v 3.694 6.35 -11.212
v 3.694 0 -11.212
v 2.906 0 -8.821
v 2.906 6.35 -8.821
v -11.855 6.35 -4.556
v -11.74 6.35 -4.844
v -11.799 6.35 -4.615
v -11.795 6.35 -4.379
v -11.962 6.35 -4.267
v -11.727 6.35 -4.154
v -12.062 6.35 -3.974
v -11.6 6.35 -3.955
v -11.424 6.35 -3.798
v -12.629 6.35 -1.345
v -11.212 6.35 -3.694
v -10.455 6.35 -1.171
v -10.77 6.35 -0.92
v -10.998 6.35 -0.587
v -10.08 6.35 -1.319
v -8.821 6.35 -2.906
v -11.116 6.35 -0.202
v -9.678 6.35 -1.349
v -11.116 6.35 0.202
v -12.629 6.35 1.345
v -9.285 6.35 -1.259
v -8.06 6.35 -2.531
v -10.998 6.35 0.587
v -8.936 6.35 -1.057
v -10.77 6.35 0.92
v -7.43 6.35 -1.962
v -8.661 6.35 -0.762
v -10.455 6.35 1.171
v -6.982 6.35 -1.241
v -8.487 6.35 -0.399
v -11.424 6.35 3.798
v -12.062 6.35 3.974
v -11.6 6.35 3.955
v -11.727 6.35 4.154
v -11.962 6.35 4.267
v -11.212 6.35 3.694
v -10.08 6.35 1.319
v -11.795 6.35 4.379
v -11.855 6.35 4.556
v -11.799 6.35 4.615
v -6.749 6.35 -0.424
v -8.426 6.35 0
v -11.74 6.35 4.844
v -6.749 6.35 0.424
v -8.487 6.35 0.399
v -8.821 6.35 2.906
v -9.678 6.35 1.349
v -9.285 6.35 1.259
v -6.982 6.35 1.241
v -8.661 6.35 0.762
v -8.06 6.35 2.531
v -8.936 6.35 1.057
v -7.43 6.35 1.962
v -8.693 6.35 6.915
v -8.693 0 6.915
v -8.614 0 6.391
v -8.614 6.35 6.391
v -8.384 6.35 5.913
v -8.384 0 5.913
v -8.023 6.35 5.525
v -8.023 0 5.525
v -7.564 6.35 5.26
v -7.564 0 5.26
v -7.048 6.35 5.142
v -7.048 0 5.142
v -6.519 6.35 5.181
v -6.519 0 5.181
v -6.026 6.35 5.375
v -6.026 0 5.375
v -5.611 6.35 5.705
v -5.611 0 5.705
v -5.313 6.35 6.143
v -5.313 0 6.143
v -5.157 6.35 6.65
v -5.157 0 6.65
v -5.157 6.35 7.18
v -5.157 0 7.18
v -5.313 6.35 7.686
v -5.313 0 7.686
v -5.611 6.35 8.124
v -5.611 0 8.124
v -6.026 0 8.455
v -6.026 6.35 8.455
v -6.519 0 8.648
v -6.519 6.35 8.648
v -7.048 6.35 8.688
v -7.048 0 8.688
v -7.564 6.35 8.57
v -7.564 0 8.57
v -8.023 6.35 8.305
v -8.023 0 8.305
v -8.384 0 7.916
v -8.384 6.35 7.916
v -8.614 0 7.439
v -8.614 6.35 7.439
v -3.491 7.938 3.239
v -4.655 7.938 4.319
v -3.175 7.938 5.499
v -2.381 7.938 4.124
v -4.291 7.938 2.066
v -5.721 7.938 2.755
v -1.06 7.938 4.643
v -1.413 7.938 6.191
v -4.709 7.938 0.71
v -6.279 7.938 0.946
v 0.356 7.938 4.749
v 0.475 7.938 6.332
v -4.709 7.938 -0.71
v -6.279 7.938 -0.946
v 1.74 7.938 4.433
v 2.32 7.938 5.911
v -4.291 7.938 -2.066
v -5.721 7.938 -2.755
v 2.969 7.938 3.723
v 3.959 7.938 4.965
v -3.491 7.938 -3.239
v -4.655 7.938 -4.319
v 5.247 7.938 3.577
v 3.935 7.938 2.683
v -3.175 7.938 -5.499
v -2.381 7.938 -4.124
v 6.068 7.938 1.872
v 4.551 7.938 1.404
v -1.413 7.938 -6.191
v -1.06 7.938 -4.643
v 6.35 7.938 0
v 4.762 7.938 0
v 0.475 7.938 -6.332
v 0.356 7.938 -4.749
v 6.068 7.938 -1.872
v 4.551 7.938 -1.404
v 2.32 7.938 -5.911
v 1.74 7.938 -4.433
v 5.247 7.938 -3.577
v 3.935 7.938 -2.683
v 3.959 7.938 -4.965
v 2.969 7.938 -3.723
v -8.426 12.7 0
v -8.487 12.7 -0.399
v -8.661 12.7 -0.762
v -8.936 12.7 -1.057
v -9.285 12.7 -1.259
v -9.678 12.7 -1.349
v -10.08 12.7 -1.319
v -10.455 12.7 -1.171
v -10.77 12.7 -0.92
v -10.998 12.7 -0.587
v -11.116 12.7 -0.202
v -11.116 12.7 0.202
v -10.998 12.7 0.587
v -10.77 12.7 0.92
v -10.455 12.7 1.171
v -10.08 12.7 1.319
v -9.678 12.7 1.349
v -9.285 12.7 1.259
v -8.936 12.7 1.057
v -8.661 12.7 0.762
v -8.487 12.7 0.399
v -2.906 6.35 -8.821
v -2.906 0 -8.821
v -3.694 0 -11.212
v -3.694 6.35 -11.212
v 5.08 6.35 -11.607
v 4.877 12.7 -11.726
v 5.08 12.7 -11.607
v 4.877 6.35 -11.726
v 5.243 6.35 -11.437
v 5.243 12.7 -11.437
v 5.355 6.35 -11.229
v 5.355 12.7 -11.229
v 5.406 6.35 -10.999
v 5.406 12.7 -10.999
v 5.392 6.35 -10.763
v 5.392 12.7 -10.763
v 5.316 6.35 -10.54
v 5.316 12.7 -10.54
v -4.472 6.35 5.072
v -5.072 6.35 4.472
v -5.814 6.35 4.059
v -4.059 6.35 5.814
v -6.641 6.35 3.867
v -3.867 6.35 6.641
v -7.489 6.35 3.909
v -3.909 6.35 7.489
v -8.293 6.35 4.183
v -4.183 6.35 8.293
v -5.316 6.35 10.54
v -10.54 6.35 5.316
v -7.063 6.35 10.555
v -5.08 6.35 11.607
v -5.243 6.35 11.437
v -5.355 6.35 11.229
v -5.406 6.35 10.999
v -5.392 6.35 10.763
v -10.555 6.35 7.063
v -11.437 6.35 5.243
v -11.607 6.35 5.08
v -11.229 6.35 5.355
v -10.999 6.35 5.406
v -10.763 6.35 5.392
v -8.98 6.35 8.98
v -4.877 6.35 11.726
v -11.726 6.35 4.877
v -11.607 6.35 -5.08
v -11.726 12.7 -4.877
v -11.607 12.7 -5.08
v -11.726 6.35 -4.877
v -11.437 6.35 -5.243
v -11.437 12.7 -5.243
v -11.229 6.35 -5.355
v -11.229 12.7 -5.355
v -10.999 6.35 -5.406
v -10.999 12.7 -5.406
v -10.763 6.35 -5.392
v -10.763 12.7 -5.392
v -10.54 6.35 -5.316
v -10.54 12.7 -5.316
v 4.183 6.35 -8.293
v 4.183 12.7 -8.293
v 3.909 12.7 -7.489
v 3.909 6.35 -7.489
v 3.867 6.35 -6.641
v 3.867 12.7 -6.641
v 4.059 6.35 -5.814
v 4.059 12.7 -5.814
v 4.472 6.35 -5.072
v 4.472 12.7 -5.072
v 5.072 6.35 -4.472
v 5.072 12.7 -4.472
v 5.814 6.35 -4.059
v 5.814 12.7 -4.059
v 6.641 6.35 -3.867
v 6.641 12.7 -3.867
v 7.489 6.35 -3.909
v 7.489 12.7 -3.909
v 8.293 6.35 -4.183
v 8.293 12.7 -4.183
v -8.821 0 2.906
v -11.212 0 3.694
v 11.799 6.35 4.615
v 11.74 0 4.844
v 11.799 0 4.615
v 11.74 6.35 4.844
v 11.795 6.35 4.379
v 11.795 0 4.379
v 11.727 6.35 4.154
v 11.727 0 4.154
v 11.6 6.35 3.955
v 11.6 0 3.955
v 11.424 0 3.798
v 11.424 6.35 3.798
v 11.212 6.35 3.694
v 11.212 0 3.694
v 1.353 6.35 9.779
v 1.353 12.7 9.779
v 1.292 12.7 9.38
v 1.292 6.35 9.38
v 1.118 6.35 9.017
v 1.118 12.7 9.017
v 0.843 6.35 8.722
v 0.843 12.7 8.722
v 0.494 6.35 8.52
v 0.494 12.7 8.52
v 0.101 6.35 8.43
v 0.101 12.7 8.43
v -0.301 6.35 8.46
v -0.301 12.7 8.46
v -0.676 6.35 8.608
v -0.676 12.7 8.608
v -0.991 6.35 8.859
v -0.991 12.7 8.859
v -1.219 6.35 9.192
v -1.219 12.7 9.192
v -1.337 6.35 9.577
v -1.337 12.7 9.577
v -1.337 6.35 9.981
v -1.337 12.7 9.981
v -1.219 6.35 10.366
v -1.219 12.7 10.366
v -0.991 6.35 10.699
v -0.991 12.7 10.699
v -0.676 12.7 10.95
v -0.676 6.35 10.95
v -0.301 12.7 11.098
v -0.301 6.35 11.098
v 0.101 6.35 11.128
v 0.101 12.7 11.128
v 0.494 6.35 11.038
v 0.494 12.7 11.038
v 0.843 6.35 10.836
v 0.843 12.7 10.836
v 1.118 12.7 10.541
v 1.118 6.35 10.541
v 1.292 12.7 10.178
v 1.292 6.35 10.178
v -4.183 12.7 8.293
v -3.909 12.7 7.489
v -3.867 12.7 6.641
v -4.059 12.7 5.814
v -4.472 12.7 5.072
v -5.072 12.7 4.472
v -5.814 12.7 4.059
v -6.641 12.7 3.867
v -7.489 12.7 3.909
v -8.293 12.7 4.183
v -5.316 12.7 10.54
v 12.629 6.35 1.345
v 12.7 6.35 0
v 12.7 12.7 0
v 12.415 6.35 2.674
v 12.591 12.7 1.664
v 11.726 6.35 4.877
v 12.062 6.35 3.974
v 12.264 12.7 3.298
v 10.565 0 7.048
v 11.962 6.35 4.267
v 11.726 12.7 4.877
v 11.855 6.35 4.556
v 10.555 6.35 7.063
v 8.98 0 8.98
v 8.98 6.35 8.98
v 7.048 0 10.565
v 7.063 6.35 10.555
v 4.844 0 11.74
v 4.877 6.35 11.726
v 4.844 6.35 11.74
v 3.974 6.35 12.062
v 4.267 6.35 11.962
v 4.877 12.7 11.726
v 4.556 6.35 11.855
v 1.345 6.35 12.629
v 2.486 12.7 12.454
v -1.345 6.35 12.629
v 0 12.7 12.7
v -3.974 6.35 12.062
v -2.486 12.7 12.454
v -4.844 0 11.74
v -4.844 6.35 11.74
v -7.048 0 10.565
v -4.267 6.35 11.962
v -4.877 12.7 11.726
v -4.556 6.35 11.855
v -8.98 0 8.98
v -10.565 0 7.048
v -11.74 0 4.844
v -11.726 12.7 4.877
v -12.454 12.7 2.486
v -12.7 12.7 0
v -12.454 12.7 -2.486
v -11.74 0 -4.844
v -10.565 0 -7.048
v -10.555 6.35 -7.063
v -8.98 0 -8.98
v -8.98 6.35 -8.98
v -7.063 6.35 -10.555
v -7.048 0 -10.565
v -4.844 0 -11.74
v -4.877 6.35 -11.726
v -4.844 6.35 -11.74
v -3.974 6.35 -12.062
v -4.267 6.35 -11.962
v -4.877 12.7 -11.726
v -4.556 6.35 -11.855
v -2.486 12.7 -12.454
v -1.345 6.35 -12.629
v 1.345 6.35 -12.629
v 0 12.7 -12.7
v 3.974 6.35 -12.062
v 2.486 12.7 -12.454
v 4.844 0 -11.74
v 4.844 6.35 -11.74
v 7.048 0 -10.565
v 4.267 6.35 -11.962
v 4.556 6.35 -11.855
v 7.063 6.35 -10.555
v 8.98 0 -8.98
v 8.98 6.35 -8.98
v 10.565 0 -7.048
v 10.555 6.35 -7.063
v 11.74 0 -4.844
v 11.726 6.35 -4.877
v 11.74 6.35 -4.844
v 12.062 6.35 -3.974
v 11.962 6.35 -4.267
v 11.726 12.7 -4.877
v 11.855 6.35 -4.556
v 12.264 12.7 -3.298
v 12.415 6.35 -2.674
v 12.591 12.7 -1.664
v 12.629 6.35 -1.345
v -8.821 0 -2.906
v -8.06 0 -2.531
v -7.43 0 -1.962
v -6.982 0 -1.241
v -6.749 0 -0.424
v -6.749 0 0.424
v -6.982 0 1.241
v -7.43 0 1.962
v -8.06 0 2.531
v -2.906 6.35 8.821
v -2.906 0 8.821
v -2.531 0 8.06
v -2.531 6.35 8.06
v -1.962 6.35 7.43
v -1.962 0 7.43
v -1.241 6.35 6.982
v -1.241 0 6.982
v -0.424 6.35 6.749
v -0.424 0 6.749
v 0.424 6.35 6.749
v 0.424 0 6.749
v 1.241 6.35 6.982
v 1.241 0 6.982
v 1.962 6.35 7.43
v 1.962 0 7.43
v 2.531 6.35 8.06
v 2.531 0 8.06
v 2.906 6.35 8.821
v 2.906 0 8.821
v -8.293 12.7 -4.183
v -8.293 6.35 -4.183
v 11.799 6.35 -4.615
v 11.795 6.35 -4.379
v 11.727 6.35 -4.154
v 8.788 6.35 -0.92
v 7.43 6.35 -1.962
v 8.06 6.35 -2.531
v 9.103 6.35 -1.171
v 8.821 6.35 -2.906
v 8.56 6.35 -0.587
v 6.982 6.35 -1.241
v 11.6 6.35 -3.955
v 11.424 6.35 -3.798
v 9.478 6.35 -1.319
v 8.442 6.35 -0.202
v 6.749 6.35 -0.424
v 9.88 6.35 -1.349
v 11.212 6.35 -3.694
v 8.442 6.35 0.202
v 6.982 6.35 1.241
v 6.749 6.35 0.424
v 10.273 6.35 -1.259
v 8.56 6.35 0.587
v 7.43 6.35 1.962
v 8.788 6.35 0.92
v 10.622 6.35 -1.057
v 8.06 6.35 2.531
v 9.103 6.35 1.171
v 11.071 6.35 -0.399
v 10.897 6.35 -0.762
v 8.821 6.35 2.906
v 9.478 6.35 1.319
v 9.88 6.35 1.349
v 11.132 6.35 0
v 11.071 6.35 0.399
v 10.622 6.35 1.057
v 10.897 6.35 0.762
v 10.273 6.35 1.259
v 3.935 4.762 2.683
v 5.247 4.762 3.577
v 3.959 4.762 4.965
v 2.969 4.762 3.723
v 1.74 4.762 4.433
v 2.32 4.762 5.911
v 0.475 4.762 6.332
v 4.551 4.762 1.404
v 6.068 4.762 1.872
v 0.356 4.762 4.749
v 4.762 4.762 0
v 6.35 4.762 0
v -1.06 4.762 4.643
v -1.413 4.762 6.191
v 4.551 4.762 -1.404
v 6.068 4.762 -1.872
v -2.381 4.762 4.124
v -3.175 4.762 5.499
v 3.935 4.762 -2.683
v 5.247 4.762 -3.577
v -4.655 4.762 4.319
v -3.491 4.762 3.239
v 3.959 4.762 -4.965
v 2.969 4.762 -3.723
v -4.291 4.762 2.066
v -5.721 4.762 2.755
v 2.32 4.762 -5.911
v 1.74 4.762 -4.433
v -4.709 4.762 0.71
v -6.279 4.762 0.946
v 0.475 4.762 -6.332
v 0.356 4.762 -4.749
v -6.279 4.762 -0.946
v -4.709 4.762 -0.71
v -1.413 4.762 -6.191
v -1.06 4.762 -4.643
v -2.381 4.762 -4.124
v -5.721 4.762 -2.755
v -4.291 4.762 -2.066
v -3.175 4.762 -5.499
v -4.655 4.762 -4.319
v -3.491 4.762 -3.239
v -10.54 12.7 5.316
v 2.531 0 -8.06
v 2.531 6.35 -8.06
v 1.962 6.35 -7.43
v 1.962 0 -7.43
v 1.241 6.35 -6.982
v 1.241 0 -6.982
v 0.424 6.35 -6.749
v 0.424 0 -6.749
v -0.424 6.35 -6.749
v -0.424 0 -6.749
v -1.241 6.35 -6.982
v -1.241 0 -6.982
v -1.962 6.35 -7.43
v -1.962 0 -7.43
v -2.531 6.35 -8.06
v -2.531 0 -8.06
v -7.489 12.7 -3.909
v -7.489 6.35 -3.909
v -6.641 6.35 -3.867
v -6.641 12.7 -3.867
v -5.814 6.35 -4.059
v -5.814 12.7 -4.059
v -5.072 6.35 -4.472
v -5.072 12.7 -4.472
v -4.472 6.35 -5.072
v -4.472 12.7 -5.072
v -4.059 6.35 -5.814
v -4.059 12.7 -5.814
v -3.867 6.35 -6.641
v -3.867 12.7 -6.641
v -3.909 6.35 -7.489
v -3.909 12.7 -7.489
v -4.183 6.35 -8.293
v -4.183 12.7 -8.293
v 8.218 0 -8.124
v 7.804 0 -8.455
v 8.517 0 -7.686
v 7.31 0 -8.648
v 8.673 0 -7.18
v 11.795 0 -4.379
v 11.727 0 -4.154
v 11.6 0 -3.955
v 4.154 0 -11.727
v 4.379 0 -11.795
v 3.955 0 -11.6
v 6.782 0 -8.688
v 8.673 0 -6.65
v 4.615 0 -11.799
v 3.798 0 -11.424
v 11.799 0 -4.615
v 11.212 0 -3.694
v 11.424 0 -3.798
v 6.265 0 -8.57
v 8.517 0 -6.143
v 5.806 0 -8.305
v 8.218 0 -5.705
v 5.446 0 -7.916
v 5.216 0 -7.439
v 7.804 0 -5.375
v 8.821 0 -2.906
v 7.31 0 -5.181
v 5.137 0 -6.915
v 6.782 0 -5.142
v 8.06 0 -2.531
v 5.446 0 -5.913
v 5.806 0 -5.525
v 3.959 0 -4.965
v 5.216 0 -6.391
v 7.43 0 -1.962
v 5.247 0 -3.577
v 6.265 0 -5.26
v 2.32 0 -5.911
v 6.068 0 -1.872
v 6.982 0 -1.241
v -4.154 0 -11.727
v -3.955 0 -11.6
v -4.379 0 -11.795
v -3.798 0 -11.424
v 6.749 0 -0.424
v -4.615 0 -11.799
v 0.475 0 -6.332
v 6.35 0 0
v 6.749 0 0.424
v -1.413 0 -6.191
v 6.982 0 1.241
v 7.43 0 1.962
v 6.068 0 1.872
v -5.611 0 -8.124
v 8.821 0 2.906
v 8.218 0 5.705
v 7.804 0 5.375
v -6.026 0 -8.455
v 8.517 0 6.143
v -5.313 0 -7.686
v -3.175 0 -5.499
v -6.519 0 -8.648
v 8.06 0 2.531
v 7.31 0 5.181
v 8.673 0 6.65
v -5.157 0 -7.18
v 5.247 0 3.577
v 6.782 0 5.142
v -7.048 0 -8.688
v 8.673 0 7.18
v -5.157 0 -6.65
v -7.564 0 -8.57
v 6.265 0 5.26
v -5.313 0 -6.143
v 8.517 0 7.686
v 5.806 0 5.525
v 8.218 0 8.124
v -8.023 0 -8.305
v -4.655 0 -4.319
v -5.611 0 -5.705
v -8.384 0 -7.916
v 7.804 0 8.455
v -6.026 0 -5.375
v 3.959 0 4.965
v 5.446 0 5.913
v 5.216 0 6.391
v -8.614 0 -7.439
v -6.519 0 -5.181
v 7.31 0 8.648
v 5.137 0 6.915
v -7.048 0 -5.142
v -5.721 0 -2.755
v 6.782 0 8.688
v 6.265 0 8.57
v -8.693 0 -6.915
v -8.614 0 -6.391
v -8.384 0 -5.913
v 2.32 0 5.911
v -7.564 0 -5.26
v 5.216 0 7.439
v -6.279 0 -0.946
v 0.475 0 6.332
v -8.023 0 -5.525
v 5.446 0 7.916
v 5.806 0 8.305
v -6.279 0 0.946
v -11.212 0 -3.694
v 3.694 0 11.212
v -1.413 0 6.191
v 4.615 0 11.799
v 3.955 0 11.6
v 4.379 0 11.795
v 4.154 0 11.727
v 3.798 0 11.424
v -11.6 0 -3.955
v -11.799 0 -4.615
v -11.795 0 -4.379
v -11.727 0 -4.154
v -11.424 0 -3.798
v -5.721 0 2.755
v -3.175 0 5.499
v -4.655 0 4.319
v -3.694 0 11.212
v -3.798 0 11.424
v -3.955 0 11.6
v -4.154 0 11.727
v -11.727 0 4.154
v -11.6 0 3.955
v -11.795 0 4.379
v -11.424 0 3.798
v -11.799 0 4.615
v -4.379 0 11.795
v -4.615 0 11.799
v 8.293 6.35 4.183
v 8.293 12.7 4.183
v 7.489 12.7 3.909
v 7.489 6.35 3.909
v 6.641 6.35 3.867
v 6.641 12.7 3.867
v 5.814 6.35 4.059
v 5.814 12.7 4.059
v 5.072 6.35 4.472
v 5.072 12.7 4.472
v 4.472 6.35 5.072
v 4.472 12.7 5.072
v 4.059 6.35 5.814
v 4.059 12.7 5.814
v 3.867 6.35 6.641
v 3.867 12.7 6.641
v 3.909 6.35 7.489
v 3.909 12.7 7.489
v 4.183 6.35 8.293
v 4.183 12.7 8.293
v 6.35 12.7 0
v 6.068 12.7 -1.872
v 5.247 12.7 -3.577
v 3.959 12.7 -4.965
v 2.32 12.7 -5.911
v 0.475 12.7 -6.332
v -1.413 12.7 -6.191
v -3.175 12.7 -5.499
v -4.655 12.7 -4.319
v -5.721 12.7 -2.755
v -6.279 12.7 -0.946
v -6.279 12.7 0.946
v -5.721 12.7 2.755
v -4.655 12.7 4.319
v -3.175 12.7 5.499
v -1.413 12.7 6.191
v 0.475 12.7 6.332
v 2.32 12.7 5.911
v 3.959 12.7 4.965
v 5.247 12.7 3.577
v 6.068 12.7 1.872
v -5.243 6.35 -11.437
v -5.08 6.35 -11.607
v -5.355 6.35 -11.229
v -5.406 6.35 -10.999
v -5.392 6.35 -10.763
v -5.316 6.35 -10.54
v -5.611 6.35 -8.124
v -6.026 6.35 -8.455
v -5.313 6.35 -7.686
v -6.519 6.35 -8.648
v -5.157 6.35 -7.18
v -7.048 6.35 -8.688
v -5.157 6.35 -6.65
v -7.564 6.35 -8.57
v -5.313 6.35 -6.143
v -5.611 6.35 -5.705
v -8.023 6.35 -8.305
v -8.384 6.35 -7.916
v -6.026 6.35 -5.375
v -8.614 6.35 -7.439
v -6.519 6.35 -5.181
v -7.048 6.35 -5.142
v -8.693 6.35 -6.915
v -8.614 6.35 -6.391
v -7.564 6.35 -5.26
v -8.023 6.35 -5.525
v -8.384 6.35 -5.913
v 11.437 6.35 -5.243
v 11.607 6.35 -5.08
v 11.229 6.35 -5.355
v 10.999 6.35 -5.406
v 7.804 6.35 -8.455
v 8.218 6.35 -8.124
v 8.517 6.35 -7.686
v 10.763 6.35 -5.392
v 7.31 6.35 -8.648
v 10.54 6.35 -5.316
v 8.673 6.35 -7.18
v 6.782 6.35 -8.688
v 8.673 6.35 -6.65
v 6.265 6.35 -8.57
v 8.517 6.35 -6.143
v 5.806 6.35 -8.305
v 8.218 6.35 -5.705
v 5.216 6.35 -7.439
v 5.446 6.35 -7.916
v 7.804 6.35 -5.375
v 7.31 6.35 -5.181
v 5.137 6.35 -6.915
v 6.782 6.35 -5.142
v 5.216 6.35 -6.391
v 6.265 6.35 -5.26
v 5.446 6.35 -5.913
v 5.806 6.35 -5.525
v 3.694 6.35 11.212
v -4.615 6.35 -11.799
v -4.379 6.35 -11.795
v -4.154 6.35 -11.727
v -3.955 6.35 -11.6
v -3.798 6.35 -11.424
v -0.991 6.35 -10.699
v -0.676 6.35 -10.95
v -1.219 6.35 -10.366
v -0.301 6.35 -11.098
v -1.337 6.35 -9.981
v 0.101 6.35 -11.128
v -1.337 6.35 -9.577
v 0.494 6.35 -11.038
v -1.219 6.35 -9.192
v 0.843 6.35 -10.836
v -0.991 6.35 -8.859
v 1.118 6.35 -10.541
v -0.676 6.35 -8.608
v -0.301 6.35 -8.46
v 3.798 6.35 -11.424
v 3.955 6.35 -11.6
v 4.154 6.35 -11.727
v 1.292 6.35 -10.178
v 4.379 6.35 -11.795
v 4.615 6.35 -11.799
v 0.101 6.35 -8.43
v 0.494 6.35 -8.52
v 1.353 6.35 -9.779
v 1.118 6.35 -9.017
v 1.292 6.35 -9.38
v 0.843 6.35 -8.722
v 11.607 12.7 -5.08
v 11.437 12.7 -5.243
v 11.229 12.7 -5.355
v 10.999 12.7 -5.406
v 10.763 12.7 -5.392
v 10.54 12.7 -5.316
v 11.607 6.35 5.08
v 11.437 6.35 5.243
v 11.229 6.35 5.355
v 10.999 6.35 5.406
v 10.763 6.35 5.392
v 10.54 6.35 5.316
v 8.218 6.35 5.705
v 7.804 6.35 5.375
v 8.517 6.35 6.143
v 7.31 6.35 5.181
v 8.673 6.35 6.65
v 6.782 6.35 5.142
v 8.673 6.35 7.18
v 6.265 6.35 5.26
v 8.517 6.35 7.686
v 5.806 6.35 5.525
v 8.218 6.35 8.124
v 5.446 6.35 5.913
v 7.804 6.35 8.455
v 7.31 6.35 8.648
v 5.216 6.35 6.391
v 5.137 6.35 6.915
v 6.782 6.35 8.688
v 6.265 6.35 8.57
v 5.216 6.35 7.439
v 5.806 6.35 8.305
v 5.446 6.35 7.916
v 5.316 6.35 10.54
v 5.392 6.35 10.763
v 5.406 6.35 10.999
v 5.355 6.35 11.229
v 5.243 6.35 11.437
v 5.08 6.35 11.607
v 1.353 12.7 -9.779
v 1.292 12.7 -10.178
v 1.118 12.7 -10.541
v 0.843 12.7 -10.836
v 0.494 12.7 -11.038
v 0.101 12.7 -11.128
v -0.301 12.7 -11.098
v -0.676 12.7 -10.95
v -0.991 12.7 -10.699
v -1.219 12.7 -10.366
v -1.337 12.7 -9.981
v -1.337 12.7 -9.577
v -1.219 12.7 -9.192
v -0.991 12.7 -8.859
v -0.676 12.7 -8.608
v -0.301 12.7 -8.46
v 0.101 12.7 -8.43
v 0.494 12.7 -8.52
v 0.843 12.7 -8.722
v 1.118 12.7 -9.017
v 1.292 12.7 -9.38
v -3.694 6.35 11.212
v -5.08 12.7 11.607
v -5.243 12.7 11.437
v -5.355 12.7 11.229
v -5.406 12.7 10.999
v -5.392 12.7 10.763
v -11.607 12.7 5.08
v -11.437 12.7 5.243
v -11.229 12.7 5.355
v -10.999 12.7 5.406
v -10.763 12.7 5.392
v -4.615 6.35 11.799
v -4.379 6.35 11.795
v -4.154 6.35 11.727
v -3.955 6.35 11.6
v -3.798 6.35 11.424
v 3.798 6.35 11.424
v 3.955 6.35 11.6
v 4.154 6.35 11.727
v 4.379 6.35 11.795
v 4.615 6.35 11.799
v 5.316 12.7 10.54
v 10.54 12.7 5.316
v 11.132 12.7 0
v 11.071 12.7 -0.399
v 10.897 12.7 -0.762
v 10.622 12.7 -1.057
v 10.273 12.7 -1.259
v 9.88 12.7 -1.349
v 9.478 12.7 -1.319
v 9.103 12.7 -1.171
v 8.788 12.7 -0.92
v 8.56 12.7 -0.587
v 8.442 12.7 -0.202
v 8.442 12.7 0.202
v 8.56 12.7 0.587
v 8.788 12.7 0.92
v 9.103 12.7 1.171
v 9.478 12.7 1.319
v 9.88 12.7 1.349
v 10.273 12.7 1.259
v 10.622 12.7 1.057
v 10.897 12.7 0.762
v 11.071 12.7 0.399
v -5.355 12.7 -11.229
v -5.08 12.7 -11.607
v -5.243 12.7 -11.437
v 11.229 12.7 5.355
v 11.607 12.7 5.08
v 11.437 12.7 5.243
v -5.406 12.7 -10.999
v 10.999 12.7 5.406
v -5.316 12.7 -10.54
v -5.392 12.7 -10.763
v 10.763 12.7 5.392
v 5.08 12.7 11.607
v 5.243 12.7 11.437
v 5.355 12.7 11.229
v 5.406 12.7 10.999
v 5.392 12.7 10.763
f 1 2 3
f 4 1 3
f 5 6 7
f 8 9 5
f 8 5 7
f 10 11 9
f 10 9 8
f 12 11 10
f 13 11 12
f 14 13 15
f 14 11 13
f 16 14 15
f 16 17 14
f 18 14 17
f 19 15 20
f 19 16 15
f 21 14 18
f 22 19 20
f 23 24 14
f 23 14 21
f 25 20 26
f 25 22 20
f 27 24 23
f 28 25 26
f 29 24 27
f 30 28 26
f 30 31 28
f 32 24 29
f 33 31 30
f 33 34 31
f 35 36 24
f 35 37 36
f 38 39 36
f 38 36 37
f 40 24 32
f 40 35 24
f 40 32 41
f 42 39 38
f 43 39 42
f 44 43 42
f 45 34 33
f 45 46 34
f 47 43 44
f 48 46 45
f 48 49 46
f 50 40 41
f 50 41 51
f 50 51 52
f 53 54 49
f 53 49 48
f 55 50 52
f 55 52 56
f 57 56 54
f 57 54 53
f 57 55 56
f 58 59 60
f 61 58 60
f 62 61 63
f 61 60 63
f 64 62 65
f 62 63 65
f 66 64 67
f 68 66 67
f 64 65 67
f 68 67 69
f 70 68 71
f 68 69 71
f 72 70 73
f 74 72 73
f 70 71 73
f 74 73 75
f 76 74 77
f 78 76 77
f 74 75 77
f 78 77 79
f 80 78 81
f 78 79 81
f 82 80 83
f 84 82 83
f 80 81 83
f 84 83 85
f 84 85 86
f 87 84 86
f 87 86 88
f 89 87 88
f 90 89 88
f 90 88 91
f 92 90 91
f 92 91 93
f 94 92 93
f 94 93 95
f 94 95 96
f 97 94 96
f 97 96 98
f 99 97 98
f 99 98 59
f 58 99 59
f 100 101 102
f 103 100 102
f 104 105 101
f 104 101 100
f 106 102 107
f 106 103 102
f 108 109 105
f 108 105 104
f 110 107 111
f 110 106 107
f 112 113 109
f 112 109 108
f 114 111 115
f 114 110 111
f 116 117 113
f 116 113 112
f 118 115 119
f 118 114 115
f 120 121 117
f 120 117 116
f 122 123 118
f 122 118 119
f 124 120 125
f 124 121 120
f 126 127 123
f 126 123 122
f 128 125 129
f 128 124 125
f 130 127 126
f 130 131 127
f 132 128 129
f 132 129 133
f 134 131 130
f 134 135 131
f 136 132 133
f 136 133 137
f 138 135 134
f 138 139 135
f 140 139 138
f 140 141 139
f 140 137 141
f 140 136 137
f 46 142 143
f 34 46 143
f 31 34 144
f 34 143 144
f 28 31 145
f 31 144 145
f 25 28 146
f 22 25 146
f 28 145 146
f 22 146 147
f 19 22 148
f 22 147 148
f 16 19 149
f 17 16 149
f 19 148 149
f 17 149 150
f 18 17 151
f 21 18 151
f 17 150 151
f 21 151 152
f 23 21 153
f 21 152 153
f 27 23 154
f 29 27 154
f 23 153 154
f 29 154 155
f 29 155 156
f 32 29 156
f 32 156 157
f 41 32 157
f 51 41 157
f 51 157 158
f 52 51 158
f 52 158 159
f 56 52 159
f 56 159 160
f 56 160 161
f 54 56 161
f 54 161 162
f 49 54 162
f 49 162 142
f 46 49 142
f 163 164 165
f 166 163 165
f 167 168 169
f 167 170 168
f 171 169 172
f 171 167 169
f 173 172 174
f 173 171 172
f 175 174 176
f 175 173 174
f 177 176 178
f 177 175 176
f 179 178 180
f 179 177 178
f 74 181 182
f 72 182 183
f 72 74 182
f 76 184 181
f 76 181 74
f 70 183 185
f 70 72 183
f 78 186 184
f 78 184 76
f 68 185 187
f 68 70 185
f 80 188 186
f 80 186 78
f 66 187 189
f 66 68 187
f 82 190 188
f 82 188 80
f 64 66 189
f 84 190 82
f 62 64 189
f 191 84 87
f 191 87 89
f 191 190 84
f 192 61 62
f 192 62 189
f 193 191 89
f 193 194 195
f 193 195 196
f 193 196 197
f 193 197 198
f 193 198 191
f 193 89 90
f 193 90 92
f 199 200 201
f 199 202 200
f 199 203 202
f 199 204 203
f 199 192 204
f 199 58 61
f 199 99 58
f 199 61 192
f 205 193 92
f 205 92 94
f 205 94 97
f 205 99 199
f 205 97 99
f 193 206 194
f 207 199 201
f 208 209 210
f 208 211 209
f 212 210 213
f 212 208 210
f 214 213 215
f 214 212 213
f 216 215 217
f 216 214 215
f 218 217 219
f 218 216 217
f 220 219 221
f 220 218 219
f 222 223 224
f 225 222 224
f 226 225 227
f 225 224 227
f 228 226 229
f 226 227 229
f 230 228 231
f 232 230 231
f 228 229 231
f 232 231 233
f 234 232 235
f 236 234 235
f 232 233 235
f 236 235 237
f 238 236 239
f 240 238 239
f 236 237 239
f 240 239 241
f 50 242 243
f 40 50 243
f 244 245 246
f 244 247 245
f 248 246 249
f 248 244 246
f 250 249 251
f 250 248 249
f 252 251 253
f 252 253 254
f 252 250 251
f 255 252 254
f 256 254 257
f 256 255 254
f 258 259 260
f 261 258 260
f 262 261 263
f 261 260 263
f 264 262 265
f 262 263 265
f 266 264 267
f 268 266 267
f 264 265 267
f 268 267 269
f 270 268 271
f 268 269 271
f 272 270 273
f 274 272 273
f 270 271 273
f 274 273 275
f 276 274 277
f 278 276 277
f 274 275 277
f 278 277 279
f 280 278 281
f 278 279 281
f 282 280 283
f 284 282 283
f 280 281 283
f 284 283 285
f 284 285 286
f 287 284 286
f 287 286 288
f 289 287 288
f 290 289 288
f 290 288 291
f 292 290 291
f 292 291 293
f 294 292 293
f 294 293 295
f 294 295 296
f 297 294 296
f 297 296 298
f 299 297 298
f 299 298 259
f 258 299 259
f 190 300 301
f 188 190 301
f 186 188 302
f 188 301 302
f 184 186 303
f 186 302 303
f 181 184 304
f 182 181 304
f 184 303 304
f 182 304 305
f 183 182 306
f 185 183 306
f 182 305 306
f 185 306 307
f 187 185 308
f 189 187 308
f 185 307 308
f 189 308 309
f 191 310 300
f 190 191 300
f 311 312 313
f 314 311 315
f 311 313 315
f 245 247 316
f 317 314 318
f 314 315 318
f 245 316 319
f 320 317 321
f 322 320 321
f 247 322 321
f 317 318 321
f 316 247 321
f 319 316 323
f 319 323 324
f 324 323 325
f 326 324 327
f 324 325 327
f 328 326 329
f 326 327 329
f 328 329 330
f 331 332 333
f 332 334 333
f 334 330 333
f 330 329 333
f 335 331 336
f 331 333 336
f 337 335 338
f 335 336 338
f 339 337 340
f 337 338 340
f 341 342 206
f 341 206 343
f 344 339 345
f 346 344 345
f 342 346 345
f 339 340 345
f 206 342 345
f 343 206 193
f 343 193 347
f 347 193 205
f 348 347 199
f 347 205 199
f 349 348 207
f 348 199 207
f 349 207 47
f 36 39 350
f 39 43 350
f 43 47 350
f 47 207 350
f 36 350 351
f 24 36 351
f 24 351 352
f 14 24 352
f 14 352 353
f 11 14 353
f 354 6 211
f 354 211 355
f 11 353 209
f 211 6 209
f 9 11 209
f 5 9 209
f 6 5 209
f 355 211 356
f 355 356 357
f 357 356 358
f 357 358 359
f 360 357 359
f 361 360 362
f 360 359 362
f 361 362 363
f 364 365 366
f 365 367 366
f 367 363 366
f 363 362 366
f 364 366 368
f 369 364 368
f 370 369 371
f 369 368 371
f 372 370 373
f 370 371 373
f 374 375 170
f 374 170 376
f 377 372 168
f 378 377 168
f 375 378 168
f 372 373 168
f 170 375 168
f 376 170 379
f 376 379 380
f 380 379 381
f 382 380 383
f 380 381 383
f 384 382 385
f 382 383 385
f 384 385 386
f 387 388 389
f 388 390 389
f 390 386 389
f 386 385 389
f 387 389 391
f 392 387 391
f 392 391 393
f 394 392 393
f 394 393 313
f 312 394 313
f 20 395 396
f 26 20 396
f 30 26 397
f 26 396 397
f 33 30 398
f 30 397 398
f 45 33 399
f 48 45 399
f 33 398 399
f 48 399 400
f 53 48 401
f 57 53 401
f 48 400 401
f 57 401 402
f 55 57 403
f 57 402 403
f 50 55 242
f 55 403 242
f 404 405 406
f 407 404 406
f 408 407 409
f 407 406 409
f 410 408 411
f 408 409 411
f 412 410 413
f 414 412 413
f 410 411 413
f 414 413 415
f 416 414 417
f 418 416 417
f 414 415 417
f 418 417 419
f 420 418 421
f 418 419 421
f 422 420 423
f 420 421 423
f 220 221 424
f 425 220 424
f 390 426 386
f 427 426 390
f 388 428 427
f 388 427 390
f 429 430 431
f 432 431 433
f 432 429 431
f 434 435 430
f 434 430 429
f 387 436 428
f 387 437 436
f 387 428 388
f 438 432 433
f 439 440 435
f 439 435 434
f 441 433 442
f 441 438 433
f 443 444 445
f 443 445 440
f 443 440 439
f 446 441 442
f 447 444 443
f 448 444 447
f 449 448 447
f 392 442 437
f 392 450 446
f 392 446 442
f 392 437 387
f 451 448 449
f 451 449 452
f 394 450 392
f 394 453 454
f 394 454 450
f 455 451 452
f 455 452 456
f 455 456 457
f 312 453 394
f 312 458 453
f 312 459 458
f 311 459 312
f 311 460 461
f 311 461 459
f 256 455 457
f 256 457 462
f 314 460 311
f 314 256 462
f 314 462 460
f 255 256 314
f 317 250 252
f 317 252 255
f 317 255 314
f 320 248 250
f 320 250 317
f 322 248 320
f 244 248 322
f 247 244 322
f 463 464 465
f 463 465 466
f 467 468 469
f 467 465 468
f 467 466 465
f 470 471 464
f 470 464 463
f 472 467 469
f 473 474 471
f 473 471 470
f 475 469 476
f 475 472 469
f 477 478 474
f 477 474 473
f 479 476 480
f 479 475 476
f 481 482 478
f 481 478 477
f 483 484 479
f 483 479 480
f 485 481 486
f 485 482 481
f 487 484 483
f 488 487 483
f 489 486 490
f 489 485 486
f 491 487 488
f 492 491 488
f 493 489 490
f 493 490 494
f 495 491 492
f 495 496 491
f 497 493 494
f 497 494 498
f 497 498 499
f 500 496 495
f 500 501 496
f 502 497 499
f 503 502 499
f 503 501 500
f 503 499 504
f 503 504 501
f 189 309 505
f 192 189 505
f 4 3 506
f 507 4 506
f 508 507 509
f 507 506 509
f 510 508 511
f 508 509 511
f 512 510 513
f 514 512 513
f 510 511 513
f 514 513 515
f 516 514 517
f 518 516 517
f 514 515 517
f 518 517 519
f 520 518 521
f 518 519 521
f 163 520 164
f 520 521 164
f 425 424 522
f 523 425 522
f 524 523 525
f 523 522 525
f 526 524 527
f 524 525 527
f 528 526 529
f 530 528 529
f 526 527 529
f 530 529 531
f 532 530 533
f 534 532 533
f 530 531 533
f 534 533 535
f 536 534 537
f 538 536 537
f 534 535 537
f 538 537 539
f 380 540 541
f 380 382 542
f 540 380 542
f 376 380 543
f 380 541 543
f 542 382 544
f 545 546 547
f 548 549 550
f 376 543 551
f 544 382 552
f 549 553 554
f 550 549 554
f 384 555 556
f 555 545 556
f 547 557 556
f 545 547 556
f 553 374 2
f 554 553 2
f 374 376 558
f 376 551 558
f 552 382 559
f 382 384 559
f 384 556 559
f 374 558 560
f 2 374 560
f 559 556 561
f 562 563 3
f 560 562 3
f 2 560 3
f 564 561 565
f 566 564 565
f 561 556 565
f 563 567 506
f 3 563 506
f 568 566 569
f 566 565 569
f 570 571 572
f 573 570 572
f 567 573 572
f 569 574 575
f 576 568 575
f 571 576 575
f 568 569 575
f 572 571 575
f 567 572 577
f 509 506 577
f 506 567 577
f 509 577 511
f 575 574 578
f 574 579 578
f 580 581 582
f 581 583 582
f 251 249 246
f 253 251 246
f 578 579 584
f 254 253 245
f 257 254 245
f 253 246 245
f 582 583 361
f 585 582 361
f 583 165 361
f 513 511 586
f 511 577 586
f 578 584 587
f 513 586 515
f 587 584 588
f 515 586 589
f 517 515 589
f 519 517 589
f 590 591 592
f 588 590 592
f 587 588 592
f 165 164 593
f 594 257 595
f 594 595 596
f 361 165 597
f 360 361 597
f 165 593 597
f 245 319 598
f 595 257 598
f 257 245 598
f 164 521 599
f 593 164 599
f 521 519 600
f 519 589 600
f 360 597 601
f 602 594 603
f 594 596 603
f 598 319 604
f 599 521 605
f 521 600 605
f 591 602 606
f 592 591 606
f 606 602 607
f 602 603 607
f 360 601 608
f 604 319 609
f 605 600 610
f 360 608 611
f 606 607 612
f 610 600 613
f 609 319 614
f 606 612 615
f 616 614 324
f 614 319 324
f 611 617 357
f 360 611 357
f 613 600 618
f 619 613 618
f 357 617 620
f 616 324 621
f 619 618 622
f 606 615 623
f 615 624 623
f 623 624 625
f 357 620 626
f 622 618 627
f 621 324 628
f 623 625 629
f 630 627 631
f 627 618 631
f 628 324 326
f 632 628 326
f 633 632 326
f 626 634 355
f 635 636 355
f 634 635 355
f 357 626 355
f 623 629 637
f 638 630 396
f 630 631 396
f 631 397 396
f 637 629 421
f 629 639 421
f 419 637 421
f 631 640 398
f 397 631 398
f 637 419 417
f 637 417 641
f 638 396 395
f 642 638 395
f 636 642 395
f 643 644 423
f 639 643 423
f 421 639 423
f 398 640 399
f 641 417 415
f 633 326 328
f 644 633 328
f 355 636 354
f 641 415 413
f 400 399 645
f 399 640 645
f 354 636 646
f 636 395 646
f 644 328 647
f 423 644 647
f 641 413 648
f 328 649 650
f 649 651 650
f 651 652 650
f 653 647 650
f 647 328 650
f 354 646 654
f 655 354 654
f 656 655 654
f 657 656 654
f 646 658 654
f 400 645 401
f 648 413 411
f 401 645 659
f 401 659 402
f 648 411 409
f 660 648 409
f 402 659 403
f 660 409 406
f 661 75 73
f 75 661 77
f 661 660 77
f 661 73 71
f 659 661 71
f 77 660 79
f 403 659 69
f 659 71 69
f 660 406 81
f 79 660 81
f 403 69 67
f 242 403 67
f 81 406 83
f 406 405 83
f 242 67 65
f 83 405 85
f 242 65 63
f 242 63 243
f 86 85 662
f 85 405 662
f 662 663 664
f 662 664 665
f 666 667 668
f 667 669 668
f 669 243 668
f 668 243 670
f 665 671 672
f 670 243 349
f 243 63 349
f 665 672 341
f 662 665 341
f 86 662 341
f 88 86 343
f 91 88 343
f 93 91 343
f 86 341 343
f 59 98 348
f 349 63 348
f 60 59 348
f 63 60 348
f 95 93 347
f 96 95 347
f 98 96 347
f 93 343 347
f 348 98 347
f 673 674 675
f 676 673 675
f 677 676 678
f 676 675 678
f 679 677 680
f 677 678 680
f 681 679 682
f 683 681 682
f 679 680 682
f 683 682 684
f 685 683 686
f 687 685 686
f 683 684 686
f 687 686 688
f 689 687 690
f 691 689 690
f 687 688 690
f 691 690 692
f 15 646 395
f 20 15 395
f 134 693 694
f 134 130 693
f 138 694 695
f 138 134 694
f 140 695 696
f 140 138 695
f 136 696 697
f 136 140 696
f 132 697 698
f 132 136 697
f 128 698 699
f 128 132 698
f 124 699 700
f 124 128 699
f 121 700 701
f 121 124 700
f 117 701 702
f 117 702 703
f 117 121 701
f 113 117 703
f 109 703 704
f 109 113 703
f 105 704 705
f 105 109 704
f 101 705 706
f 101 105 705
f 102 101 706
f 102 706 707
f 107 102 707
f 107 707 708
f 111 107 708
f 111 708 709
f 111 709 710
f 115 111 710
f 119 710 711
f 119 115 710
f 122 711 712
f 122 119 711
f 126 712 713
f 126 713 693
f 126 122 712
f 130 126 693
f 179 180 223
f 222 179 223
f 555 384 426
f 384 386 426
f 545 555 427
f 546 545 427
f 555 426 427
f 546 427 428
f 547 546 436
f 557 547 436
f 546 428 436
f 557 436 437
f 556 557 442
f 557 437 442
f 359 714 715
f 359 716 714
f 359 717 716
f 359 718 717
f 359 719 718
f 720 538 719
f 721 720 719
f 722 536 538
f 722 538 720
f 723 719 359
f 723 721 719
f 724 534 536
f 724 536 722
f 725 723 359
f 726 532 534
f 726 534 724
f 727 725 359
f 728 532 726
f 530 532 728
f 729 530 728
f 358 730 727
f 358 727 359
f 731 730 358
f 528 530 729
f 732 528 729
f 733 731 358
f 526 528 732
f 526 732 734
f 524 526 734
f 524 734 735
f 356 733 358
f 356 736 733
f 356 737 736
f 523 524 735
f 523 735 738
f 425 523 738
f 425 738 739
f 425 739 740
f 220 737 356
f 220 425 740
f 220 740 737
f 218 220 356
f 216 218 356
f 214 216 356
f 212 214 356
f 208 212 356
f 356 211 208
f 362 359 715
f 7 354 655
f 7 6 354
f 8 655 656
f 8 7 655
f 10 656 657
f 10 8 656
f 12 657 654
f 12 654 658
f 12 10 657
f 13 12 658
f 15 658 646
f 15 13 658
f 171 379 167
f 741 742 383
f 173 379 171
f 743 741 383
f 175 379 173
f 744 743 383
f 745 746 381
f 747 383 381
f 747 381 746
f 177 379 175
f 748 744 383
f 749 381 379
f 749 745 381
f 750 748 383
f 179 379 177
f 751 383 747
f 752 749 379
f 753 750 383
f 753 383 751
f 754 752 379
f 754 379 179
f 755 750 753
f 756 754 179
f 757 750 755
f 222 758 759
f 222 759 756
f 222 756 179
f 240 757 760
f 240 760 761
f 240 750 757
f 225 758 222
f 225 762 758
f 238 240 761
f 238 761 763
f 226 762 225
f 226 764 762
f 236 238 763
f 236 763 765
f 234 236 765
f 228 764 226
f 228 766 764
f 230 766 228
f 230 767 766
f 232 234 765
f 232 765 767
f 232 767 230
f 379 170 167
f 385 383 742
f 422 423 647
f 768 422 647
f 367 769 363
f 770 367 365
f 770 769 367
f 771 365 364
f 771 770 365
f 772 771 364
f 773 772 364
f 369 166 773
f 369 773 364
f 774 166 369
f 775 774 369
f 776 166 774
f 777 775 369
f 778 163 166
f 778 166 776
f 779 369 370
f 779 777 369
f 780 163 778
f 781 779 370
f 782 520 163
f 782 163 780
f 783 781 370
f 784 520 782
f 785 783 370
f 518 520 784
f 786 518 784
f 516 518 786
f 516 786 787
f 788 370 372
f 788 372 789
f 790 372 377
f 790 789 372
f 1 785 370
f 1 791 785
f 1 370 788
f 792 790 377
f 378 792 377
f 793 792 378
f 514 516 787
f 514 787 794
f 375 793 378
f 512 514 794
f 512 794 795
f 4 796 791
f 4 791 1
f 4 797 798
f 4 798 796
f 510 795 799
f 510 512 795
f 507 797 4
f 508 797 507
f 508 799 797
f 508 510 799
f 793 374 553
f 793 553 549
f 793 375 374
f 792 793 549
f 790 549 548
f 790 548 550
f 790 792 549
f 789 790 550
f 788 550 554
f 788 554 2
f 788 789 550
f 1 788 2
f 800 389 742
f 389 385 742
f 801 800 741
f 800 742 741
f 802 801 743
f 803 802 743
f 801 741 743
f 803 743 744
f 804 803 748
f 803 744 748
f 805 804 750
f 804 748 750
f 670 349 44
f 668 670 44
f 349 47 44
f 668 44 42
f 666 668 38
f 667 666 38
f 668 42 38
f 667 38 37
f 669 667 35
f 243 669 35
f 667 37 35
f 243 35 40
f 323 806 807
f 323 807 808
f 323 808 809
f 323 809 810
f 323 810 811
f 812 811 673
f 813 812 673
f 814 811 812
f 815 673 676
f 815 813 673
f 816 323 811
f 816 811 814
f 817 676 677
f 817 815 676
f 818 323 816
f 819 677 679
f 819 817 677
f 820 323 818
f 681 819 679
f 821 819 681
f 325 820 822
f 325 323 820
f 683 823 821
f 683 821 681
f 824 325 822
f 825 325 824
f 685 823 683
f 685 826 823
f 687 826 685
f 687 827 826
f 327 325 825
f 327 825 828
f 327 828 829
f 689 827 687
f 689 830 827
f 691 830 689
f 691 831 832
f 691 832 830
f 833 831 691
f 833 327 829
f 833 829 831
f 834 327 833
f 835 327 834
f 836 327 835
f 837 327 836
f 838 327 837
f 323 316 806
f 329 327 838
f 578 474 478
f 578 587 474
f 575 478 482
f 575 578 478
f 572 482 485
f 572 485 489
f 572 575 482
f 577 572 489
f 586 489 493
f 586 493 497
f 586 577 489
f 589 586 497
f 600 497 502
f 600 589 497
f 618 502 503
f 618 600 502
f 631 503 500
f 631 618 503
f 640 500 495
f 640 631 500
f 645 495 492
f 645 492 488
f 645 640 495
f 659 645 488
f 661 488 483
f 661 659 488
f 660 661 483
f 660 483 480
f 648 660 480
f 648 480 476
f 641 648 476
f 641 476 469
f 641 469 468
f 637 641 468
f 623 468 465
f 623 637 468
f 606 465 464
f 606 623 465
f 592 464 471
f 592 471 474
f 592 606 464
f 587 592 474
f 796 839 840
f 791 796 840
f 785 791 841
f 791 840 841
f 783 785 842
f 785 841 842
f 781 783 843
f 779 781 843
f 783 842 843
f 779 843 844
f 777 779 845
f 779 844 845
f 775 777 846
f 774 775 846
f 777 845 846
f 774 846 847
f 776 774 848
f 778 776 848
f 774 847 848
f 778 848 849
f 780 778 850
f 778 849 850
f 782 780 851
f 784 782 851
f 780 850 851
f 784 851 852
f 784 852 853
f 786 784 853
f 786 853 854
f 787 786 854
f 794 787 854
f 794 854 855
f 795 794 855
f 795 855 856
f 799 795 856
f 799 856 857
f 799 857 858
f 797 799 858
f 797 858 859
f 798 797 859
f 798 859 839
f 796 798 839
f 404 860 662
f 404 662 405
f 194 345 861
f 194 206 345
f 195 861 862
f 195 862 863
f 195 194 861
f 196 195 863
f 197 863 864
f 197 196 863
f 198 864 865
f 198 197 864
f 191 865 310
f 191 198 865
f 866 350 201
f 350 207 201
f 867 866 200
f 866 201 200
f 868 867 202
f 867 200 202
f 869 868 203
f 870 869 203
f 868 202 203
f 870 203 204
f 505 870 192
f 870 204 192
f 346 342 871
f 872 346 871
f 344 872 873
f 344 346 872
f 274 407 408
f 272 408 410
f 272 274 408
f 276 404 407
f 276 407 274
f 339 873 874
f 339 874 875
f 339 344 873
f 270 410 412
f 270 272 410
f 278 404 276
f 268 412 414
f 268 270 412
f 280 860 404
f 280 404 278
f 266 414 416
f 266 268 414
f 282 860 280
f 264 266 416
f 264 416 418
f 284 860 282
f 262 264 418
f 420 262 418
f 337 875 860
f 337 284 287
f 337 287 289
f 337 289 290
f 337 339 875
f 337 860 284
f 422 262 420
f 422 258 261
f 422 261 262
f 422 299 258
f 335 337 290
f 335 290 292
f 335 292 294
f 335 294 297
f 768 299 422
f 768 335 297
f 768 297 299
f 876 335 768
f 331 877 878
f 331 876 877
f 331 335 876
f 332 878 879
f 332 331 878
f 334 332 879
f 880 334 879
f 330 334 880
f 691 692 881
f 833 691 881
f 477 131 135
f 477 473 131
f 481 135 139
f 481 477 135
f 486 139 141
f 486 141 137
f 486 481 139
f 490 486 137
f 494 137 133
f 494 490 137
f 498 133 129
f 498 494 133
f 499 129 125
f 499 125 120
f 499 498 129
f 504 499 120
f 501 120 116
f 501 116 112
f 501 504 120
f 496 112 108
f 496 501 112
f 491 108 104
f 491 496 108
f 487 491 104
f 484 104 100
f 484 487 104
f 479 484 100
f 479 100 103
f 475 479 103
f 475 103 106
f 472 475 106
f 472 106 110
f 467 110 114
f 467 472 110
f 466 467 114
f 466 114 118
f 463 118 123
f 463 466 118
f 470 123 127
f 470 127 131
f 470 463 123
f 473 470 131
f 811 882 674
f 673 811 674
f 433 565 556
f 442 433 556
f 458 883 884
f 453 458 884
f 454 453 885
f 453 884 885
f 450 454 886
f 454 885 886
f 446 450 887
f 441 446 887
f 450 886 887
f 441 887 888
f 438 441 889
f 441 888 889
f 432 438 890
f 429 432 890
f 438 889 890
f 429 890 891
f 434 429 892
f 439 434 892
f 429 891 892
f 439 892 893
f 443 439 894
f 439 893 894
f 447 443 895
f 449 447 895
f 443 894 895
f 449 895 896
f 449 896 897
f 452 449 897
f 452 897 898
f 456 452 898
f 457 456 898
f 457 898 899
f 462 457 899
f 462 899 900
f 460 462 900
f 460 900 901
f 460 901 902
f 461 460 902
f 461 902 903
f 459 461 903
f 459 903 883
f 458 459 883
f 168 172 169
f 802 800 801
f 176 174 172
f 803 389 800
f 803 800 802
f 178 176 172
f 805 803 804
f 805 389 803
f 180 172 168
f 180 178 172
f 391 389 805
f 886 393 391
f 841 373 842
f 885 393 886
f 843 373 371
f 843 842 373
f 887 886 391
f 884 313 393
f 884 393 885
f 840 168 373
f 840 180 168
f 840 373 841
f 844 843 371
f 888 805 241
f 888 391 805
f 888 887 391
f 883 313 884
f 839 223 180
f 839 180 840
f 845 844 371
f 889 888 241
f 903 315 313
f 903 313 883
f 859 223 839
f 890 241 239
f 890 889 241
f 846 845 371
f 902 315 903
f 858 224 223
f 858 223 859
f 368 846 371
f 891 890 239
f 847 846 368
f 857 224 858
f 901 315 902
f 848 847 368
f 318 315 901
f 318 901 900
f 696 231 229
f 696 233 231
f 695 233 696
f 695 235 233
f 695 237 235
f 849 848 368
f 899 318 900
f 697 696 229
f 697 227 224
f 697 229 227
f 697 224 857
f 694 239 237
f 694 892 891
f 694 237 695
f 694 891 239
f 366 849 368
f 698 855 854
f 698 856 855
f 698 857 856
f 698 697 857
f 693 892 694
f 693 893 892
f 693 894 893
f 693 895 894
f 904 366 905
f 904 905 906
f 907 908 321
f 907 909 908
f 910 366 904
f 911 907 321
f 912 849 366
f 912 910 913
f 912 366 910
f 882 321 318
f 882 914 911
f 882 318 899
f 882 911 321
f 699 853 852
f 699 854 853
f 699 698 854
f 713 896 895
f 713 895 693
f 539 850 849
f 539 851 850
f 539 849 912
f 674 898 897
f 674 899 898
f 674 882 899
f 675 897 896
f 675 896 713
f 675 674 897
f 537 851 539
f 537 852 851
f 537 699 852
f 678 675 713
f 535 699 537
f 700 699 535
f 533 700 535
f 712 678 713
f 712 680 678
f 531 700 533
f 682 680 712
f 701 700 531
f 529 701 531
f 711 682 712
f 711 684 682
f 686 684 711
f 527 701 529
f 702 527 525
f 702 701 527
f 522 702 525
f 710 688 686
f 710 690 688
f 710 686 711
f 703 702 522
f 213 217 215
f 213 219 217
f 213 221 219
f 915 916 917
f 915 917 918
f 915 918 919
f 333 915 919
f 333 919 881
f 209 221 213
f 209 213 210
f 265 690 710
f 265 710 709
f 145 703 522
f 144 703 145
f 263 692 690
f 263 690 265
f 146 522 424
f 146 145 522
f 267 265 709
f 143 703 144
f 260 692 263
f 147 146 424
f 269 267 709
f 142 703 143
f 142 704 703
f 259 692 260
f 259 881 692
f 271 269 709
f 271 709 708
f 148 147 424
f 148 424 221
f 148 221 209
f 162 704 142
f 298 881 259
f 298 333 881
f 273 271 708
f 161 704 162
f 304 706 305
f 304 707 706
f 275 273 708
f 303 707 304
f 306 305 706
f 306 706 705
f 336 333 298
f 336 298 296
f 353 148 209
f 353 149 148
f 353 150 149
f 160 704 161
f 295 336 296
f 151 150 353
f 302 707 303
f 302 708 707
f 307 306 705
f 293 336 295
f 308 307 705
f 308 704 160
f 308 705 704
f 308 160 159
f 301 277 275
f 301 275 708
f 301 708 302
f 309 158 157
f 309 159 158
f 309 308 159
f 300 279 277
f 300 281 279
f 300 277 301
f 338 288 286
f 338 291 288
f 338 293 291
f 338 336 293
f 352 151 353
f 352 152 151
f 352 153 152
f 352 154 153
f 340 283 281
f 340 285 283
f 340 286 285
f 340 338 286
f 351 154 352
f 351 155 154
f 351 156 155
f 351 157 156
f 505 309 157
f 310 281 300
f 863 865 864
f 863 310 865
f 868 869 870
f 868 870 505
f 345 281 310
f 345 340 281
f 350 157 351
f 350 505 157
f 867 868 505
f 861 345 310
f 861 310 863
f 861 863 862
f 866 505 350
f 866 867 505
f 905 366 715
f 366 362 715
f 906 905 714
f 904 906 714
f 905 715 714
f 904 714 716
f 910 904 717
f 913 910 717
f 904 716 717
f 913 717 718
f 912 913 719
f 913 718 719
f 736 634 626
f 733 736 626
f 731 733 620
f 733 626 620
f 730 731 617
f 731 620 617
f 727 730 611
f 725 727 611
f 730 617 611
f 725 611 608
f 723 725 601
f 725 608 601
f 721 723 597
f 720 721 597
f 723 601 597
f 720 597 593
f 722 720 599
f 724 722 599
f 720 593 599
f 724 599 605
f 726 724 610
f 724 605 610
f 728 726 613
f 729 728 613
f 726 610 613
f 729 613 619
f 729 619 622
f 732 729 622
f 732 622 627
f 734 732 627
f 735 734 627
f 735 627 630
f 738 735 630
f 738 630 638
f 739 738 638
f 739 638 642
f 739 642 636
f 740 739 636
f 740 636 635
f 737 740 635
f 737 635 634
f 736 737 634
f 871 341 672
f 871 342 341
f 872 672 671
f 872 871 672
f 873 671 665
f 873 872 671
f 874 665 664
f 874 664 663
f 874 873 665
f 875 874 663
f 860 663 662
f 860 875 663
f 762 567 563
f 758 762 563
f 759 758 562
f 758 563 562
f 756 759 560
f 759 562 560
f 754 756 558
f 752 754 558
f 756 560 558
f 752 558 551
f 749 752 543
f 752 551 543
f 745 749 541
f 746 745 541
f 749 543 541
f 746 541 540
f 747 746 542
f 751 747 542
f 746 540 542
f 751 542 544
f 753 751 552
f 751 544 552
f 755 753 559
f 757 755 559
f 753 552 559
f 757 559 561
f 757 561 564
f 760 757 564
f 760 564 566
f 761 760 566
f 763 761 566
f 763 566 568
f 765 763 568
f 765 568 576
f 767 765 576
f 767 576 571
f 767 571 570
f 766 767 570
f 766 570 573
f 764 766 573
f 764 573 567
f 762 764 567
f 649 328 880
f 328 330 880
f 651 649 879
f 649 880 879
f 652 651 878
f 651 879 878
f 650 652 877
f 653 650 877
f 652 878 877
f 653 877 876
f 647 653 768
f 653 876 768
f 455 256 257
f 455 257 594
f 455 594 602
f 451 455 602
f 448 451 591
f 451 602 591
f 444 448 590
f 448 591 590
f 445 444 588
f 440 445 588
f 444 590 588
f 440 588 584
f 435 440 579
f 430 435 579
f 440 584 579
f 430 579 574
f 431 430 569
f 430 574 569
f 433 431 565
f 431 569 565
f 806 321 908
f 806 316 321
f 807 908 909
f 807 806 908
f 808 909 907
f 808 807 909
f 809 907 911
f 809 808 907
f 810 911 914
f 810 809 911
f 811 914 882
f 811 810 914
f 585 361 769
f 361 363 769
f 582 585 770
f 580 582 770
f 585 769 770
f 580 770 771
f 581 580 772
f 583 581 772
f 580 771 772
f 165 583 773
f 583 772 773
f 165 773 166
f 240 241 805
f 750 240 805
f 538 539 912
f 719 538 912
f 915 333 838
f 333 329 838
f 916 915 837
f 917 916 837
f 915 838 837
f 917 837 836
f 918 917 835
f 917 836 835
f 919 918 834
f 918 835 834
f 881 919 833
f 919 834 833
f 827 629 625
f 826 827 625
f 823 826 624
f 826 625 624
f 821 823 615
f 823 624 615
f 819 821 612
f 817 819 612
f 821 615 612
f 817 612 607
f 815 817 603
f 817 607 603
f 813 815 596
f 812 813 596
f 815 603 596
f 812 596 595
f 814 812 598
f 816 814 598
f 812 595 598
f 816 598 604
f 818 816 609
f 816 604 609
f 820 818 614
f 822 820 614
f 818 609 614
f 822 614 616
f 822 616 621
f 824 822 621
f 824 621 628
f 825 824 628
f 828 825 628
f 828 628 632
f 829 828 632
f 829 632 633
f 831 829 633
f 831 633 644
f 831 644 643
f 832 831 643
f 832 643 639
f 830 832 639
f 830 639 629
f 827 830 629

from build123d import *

# Parameters (mm, degrees)
SKETCH1_W                  = 12.7
SKETCH1_H                  = 12.7
CUT_EXTRUDE1_DEPTH         = 6.35
CUT_EXTRUDE2_DEPTH         = 6.35
CUT_EXTRUDE3_DEPTH         = 6.35
CUT_EXTRUDE4_DEPTH         = 6.35
CUT_EXTRUDE5_DEPTH         = 6.35
CUT_EXTRUDE6_DEPTH         = 6.35
CUT_EXTRUDE7_DEPTH         = 6.35
CUT_EXTRUDE8_DEPTH         = 6.35
M3_CLEARANCE_HOLE1_D       = 3.556
M3_CLEARANCE_HOLE1_DEPTH   = 6.35
M2_5_CLEARANCE_HOLE1_D     = 2.7051
M2_5_CLEARANCE_HOLE1_DEPTH = 6.35
FILLET1_R                  = 0.8636


with BuildPart() as part:
    # Sketch1 → Revolve1 (revolve)
    with BuildSketch(Plane.XY):
        with Locations((6.35, 6.35)):
            Rectangle(SKETCH1_W, SKETCH1_H)
    revolve(axis=Axis((0, 12.7, 0), (0, -1, 0)))

    # Sketch2 → Cut-Extrude1 (cut)
    with BuildSketch(Plane(origin=(0, 12.7, 0), x_dir=(-1, 0, 0), z_dir=(0, 1, 0))):
        with BuildLine():
            Line((-5.719139865, -11.339375609), (-4.182577123, -8.292822721))
            ThreePointArc((-4.182577123, -8.292822721), (-4.751006452, -4.751006452), (-8.292822721, -4.182577123))
            Line((-8.292822721, -4.182577123), (-11.339375609, -5.719139865))
            ThreePointArc((-11.339375609, -5.719139865), (-8.980256121, -8.980256121), (-5.719139865, -11.339375609))
        make_face()
    extrude(amount=-CUT_EXTRUDE1_DEPTH, mode=Mode.SUBTRACT)

    # Sketch3 → Cut-Extrude2 (cut)
    with BuildSketch(Plane(origin=(0, 12.7, 0), x_dir=(-1, 0, 0), z_dir=(0, 1, 0))):
        with BuildLine():
            Line((-11.339375609, 5.719139865), (-8.292822721, 4.182577123))
            ThreePointArc((-8.292822721, 4.182577123), (-4.751006452, 4.751006452), (-4.182577123, 8.292822721))
            Line((-4.182577123, 8.292822721), (-5.719139865, 11.339375609))
            ThreePointArc((-5.719139865, 11.339375609), (-8.980256121, 8.980256121), (-11.339375609, 5.719139865))
        make_face()
    extrude(amount=-CUT_EXTRUDE2_DEPTH, mode=Mode.SUBTRACT)

    # Sketch4 → Cut-Extrude3 (cut)
    with BuildSketch(Plane.XZ):
        with BuildLine():
            Line((12.062191969, 3.974106807), (8.821439828, 2.906382535))
            ThreePointArc((8.821439828, 2.906382535), (6.718937759, 0), (8.821439828, -2.906382535))
            Line((8.821439828, -2.906382535), (12.062191969, -3.974106807))
            ThreePointArc((12.062191969, -3.974106807), (12.7, 0), (12.062191969, 3.974106807))
        make_face()
    extrude(amount=-CUT_EXTRUDE3_DEPTH, mode=Mode.SUBTRACT)

    # Sketch5 → Cut-Extrude4 (cut)
    with BuildSketch(Plane(origin=(0, 12.7, 0), x_dir=(-1, 0, 0), z_dir=(0, 1, 0))):
        with BuildLine():
            Line((5.719139865, 11.339375609), (4.182577123, 8.292822721))
            ThreePointArc((4.182577123, 8.292822721), (4.751006452, 4.751006452), (8.292822721, 4.182577123))
            Line((8.292822721, 4.182577123), (11.339375609, 5.719139865))
            ThreePointArc((11.339375609, 5.719139865), (8.980256121, 8.980256121), (5.719139865, 11.339375609))
        make_face()
    extrude(amount=-CUT_EXTRUDE4_DEPTH, mode=Mode.SUBTRACT)

    # Sketch6 → Cut-Extrude5 (cut)
    with BuildSketch(Plane(origin=(0, 12.7, 0), x_dir=(-1, 0, 0), z_dir=(0, 1, 0))):
        with BuildLine():
            Line((11.339375609, -5.719139865), (8.292822721, -4.182577123))
            ThreePointArc((8.292822721, -4.182577123), (4.751006452, -4.751006452), (4.182577123, -8.292822721))
            Line((4.182577123, -8.292822721), (5.719139865, -11.339375609))
            ThreePointArc((5.719139865, -11.339375609), (8.980256121, -8.980256121), (11.339375609, -5.719139865))
        make_face()
    extrude(amount=-CUT_EXTRUDE5_DEPTH, mode=Mode.SUBTRACT)

    # Sketch7 → Cut-Extrude6 (cut)
    with BuildSketch(Plane.XZ):
        with BuildLine():
            Line((3.974106807, -12.062191969), (2.906382535, -8.821439828))
            ThreePointArc((2.906382535, -8.821439828), (0, -6.718937759), (-2.906382535, -8.821439828))
            Line((-2.906382535, -8.821439828), (-3.974106807, -12.062191969))
            ThreePointArc((-3.974106807, -12.062191969), (0, -12.7), (3.974106807, -12.062191969))
        make_face()
    extrude(amount=-CUT_EXTRUDE6_DEPTH, mode=Mode.SUBTRACT)

    # Sketch8 → Cut-Extrude7 (cut)
    with BuildSketch(Plane.XZ):
        with BuildLine():
            Line((-12.062191969, -3.974106807), (-8.821439828, -2.906382535))
            ThreePointArc((-8.821439828, -2.906382535), (-6.718937759, 0), (-8.821439828, 2.906382535))
            Line((-8.821439828, 2.906382535), (-12.062191969, 3.974106807))
            ThreePointArc((-12.062191969, 3.974106807), (-12.7, 0), (-12.062191969, -3.974106807))
        make_face()
    extrude(amount=-CUT_EXTRUDE7_DEPTH, mode=Mode.SUBTRACT)

    # Sketch9 → Cut-Extrude8 (cut)
    with BuildSketch(Plane.XZ):
        with BuildLine():
            Line((-3.974106807, 12.062191969), (-2.906382535, 8.821439828))
            ThreePointArc((-2.906382535, 8.821439828), (0, 6.718937759), (2.906382535, 8.821439828))
            Line((2.906382535, 8.821439828), (3.974106807, 12.062191969))
            ThreePointArc((3.974106807, 12.062191969), (0, 12.7), (-3.974106807, 12.062191969))
        make_face()
    extrude(amount=-CUT_EXTRUDE8_DEPTH, mode=Mode.SUBTRACT)

    # Sketch10 → Cut-Revolve1 (revolve, cut)
    with BuildSketch(Plane(origin=(0, 0, 0), x_dir=(-1, 0, 0), z_dir=(0, 0, -1))):
        Polygon((-6.35, 0), (0, 0), (0, 12.7), (-6.35, 12.7), (-6.35, 7.9375), (-4.7625, 7.9375), (-4.7625, 4.7625), (-6.35, 4.7625), align=None)
    revolve(axis=Axis((0, 0, 0), (0, 1, 0)), mode=Mode.SUBTRACT)

    # M3 Clearance Hole1
    with Locations(Plane(origin=(0, 6.35, 0), x_dir=(1, 0, 0), z_dir=(0, 1, 0))):
        with Locations((6.914797213, 6.914797213), (-6.914797213, 6.914797213), (-6.914797213, -6.914797213), (6.914797213, -6.914797213)):
            Hole(M3_CLEARANCE_HOLE1_D / 2, depth=M3_CLEARANCE_HOLE1_DEPTH)

    # M2.5 Clearance Hole1
    with Locations(Plane(origin=(0, 6.35, 0), x_dir=(-1, 0, 0), z_dir=(0, -1, 0))):
        with Locations((-9.779, 0), (0, 9.779), (9.779, 0), (0, -9.779)):
            Hole(M2_5_CLEARANCE_HOLE1_D / 2, depth=M2_5_CLEARANCE_HOLE1_DEPTH)

    # Fillet1
    fillet1_edges = [part.edges().sort_by_distance(p)[0] for p in [
        (-3.974106807, 3.175, 12.062191969),
        (3.974106807, 3.175, 12.062191969),
        (5.719139865, 9.525, -11.339375609),
        (11.339375609, 9.525, -5.719139865),
        (11.339375609, 9.525, 5.719139865),
        (5.719139865, 9.525, 11.339375609),
        (12.062191969, 3.175, 3.974106807),
        (12.062191969, 3.175, -3.974106807),
        (-5.719139865, 9.525, 11.339375609),
        (-11.339375609, 9.525, 5.719139865),
        (-11.339375609, 9.525, -5.719139865),
        (-5.719139865, 9.525, -11.339375609),
        (3.974106807, 3.175, -12.062191969),
        (-3.974106807, 3.175, -12.062191969),
        (-12.062191969, 3.175, -3.974106807),
        (-12.062191969, 3.175, 3.974106807),
    ]]
    fillet(fillet1_edges, radius=FILLET1_R)


solid = part.part
